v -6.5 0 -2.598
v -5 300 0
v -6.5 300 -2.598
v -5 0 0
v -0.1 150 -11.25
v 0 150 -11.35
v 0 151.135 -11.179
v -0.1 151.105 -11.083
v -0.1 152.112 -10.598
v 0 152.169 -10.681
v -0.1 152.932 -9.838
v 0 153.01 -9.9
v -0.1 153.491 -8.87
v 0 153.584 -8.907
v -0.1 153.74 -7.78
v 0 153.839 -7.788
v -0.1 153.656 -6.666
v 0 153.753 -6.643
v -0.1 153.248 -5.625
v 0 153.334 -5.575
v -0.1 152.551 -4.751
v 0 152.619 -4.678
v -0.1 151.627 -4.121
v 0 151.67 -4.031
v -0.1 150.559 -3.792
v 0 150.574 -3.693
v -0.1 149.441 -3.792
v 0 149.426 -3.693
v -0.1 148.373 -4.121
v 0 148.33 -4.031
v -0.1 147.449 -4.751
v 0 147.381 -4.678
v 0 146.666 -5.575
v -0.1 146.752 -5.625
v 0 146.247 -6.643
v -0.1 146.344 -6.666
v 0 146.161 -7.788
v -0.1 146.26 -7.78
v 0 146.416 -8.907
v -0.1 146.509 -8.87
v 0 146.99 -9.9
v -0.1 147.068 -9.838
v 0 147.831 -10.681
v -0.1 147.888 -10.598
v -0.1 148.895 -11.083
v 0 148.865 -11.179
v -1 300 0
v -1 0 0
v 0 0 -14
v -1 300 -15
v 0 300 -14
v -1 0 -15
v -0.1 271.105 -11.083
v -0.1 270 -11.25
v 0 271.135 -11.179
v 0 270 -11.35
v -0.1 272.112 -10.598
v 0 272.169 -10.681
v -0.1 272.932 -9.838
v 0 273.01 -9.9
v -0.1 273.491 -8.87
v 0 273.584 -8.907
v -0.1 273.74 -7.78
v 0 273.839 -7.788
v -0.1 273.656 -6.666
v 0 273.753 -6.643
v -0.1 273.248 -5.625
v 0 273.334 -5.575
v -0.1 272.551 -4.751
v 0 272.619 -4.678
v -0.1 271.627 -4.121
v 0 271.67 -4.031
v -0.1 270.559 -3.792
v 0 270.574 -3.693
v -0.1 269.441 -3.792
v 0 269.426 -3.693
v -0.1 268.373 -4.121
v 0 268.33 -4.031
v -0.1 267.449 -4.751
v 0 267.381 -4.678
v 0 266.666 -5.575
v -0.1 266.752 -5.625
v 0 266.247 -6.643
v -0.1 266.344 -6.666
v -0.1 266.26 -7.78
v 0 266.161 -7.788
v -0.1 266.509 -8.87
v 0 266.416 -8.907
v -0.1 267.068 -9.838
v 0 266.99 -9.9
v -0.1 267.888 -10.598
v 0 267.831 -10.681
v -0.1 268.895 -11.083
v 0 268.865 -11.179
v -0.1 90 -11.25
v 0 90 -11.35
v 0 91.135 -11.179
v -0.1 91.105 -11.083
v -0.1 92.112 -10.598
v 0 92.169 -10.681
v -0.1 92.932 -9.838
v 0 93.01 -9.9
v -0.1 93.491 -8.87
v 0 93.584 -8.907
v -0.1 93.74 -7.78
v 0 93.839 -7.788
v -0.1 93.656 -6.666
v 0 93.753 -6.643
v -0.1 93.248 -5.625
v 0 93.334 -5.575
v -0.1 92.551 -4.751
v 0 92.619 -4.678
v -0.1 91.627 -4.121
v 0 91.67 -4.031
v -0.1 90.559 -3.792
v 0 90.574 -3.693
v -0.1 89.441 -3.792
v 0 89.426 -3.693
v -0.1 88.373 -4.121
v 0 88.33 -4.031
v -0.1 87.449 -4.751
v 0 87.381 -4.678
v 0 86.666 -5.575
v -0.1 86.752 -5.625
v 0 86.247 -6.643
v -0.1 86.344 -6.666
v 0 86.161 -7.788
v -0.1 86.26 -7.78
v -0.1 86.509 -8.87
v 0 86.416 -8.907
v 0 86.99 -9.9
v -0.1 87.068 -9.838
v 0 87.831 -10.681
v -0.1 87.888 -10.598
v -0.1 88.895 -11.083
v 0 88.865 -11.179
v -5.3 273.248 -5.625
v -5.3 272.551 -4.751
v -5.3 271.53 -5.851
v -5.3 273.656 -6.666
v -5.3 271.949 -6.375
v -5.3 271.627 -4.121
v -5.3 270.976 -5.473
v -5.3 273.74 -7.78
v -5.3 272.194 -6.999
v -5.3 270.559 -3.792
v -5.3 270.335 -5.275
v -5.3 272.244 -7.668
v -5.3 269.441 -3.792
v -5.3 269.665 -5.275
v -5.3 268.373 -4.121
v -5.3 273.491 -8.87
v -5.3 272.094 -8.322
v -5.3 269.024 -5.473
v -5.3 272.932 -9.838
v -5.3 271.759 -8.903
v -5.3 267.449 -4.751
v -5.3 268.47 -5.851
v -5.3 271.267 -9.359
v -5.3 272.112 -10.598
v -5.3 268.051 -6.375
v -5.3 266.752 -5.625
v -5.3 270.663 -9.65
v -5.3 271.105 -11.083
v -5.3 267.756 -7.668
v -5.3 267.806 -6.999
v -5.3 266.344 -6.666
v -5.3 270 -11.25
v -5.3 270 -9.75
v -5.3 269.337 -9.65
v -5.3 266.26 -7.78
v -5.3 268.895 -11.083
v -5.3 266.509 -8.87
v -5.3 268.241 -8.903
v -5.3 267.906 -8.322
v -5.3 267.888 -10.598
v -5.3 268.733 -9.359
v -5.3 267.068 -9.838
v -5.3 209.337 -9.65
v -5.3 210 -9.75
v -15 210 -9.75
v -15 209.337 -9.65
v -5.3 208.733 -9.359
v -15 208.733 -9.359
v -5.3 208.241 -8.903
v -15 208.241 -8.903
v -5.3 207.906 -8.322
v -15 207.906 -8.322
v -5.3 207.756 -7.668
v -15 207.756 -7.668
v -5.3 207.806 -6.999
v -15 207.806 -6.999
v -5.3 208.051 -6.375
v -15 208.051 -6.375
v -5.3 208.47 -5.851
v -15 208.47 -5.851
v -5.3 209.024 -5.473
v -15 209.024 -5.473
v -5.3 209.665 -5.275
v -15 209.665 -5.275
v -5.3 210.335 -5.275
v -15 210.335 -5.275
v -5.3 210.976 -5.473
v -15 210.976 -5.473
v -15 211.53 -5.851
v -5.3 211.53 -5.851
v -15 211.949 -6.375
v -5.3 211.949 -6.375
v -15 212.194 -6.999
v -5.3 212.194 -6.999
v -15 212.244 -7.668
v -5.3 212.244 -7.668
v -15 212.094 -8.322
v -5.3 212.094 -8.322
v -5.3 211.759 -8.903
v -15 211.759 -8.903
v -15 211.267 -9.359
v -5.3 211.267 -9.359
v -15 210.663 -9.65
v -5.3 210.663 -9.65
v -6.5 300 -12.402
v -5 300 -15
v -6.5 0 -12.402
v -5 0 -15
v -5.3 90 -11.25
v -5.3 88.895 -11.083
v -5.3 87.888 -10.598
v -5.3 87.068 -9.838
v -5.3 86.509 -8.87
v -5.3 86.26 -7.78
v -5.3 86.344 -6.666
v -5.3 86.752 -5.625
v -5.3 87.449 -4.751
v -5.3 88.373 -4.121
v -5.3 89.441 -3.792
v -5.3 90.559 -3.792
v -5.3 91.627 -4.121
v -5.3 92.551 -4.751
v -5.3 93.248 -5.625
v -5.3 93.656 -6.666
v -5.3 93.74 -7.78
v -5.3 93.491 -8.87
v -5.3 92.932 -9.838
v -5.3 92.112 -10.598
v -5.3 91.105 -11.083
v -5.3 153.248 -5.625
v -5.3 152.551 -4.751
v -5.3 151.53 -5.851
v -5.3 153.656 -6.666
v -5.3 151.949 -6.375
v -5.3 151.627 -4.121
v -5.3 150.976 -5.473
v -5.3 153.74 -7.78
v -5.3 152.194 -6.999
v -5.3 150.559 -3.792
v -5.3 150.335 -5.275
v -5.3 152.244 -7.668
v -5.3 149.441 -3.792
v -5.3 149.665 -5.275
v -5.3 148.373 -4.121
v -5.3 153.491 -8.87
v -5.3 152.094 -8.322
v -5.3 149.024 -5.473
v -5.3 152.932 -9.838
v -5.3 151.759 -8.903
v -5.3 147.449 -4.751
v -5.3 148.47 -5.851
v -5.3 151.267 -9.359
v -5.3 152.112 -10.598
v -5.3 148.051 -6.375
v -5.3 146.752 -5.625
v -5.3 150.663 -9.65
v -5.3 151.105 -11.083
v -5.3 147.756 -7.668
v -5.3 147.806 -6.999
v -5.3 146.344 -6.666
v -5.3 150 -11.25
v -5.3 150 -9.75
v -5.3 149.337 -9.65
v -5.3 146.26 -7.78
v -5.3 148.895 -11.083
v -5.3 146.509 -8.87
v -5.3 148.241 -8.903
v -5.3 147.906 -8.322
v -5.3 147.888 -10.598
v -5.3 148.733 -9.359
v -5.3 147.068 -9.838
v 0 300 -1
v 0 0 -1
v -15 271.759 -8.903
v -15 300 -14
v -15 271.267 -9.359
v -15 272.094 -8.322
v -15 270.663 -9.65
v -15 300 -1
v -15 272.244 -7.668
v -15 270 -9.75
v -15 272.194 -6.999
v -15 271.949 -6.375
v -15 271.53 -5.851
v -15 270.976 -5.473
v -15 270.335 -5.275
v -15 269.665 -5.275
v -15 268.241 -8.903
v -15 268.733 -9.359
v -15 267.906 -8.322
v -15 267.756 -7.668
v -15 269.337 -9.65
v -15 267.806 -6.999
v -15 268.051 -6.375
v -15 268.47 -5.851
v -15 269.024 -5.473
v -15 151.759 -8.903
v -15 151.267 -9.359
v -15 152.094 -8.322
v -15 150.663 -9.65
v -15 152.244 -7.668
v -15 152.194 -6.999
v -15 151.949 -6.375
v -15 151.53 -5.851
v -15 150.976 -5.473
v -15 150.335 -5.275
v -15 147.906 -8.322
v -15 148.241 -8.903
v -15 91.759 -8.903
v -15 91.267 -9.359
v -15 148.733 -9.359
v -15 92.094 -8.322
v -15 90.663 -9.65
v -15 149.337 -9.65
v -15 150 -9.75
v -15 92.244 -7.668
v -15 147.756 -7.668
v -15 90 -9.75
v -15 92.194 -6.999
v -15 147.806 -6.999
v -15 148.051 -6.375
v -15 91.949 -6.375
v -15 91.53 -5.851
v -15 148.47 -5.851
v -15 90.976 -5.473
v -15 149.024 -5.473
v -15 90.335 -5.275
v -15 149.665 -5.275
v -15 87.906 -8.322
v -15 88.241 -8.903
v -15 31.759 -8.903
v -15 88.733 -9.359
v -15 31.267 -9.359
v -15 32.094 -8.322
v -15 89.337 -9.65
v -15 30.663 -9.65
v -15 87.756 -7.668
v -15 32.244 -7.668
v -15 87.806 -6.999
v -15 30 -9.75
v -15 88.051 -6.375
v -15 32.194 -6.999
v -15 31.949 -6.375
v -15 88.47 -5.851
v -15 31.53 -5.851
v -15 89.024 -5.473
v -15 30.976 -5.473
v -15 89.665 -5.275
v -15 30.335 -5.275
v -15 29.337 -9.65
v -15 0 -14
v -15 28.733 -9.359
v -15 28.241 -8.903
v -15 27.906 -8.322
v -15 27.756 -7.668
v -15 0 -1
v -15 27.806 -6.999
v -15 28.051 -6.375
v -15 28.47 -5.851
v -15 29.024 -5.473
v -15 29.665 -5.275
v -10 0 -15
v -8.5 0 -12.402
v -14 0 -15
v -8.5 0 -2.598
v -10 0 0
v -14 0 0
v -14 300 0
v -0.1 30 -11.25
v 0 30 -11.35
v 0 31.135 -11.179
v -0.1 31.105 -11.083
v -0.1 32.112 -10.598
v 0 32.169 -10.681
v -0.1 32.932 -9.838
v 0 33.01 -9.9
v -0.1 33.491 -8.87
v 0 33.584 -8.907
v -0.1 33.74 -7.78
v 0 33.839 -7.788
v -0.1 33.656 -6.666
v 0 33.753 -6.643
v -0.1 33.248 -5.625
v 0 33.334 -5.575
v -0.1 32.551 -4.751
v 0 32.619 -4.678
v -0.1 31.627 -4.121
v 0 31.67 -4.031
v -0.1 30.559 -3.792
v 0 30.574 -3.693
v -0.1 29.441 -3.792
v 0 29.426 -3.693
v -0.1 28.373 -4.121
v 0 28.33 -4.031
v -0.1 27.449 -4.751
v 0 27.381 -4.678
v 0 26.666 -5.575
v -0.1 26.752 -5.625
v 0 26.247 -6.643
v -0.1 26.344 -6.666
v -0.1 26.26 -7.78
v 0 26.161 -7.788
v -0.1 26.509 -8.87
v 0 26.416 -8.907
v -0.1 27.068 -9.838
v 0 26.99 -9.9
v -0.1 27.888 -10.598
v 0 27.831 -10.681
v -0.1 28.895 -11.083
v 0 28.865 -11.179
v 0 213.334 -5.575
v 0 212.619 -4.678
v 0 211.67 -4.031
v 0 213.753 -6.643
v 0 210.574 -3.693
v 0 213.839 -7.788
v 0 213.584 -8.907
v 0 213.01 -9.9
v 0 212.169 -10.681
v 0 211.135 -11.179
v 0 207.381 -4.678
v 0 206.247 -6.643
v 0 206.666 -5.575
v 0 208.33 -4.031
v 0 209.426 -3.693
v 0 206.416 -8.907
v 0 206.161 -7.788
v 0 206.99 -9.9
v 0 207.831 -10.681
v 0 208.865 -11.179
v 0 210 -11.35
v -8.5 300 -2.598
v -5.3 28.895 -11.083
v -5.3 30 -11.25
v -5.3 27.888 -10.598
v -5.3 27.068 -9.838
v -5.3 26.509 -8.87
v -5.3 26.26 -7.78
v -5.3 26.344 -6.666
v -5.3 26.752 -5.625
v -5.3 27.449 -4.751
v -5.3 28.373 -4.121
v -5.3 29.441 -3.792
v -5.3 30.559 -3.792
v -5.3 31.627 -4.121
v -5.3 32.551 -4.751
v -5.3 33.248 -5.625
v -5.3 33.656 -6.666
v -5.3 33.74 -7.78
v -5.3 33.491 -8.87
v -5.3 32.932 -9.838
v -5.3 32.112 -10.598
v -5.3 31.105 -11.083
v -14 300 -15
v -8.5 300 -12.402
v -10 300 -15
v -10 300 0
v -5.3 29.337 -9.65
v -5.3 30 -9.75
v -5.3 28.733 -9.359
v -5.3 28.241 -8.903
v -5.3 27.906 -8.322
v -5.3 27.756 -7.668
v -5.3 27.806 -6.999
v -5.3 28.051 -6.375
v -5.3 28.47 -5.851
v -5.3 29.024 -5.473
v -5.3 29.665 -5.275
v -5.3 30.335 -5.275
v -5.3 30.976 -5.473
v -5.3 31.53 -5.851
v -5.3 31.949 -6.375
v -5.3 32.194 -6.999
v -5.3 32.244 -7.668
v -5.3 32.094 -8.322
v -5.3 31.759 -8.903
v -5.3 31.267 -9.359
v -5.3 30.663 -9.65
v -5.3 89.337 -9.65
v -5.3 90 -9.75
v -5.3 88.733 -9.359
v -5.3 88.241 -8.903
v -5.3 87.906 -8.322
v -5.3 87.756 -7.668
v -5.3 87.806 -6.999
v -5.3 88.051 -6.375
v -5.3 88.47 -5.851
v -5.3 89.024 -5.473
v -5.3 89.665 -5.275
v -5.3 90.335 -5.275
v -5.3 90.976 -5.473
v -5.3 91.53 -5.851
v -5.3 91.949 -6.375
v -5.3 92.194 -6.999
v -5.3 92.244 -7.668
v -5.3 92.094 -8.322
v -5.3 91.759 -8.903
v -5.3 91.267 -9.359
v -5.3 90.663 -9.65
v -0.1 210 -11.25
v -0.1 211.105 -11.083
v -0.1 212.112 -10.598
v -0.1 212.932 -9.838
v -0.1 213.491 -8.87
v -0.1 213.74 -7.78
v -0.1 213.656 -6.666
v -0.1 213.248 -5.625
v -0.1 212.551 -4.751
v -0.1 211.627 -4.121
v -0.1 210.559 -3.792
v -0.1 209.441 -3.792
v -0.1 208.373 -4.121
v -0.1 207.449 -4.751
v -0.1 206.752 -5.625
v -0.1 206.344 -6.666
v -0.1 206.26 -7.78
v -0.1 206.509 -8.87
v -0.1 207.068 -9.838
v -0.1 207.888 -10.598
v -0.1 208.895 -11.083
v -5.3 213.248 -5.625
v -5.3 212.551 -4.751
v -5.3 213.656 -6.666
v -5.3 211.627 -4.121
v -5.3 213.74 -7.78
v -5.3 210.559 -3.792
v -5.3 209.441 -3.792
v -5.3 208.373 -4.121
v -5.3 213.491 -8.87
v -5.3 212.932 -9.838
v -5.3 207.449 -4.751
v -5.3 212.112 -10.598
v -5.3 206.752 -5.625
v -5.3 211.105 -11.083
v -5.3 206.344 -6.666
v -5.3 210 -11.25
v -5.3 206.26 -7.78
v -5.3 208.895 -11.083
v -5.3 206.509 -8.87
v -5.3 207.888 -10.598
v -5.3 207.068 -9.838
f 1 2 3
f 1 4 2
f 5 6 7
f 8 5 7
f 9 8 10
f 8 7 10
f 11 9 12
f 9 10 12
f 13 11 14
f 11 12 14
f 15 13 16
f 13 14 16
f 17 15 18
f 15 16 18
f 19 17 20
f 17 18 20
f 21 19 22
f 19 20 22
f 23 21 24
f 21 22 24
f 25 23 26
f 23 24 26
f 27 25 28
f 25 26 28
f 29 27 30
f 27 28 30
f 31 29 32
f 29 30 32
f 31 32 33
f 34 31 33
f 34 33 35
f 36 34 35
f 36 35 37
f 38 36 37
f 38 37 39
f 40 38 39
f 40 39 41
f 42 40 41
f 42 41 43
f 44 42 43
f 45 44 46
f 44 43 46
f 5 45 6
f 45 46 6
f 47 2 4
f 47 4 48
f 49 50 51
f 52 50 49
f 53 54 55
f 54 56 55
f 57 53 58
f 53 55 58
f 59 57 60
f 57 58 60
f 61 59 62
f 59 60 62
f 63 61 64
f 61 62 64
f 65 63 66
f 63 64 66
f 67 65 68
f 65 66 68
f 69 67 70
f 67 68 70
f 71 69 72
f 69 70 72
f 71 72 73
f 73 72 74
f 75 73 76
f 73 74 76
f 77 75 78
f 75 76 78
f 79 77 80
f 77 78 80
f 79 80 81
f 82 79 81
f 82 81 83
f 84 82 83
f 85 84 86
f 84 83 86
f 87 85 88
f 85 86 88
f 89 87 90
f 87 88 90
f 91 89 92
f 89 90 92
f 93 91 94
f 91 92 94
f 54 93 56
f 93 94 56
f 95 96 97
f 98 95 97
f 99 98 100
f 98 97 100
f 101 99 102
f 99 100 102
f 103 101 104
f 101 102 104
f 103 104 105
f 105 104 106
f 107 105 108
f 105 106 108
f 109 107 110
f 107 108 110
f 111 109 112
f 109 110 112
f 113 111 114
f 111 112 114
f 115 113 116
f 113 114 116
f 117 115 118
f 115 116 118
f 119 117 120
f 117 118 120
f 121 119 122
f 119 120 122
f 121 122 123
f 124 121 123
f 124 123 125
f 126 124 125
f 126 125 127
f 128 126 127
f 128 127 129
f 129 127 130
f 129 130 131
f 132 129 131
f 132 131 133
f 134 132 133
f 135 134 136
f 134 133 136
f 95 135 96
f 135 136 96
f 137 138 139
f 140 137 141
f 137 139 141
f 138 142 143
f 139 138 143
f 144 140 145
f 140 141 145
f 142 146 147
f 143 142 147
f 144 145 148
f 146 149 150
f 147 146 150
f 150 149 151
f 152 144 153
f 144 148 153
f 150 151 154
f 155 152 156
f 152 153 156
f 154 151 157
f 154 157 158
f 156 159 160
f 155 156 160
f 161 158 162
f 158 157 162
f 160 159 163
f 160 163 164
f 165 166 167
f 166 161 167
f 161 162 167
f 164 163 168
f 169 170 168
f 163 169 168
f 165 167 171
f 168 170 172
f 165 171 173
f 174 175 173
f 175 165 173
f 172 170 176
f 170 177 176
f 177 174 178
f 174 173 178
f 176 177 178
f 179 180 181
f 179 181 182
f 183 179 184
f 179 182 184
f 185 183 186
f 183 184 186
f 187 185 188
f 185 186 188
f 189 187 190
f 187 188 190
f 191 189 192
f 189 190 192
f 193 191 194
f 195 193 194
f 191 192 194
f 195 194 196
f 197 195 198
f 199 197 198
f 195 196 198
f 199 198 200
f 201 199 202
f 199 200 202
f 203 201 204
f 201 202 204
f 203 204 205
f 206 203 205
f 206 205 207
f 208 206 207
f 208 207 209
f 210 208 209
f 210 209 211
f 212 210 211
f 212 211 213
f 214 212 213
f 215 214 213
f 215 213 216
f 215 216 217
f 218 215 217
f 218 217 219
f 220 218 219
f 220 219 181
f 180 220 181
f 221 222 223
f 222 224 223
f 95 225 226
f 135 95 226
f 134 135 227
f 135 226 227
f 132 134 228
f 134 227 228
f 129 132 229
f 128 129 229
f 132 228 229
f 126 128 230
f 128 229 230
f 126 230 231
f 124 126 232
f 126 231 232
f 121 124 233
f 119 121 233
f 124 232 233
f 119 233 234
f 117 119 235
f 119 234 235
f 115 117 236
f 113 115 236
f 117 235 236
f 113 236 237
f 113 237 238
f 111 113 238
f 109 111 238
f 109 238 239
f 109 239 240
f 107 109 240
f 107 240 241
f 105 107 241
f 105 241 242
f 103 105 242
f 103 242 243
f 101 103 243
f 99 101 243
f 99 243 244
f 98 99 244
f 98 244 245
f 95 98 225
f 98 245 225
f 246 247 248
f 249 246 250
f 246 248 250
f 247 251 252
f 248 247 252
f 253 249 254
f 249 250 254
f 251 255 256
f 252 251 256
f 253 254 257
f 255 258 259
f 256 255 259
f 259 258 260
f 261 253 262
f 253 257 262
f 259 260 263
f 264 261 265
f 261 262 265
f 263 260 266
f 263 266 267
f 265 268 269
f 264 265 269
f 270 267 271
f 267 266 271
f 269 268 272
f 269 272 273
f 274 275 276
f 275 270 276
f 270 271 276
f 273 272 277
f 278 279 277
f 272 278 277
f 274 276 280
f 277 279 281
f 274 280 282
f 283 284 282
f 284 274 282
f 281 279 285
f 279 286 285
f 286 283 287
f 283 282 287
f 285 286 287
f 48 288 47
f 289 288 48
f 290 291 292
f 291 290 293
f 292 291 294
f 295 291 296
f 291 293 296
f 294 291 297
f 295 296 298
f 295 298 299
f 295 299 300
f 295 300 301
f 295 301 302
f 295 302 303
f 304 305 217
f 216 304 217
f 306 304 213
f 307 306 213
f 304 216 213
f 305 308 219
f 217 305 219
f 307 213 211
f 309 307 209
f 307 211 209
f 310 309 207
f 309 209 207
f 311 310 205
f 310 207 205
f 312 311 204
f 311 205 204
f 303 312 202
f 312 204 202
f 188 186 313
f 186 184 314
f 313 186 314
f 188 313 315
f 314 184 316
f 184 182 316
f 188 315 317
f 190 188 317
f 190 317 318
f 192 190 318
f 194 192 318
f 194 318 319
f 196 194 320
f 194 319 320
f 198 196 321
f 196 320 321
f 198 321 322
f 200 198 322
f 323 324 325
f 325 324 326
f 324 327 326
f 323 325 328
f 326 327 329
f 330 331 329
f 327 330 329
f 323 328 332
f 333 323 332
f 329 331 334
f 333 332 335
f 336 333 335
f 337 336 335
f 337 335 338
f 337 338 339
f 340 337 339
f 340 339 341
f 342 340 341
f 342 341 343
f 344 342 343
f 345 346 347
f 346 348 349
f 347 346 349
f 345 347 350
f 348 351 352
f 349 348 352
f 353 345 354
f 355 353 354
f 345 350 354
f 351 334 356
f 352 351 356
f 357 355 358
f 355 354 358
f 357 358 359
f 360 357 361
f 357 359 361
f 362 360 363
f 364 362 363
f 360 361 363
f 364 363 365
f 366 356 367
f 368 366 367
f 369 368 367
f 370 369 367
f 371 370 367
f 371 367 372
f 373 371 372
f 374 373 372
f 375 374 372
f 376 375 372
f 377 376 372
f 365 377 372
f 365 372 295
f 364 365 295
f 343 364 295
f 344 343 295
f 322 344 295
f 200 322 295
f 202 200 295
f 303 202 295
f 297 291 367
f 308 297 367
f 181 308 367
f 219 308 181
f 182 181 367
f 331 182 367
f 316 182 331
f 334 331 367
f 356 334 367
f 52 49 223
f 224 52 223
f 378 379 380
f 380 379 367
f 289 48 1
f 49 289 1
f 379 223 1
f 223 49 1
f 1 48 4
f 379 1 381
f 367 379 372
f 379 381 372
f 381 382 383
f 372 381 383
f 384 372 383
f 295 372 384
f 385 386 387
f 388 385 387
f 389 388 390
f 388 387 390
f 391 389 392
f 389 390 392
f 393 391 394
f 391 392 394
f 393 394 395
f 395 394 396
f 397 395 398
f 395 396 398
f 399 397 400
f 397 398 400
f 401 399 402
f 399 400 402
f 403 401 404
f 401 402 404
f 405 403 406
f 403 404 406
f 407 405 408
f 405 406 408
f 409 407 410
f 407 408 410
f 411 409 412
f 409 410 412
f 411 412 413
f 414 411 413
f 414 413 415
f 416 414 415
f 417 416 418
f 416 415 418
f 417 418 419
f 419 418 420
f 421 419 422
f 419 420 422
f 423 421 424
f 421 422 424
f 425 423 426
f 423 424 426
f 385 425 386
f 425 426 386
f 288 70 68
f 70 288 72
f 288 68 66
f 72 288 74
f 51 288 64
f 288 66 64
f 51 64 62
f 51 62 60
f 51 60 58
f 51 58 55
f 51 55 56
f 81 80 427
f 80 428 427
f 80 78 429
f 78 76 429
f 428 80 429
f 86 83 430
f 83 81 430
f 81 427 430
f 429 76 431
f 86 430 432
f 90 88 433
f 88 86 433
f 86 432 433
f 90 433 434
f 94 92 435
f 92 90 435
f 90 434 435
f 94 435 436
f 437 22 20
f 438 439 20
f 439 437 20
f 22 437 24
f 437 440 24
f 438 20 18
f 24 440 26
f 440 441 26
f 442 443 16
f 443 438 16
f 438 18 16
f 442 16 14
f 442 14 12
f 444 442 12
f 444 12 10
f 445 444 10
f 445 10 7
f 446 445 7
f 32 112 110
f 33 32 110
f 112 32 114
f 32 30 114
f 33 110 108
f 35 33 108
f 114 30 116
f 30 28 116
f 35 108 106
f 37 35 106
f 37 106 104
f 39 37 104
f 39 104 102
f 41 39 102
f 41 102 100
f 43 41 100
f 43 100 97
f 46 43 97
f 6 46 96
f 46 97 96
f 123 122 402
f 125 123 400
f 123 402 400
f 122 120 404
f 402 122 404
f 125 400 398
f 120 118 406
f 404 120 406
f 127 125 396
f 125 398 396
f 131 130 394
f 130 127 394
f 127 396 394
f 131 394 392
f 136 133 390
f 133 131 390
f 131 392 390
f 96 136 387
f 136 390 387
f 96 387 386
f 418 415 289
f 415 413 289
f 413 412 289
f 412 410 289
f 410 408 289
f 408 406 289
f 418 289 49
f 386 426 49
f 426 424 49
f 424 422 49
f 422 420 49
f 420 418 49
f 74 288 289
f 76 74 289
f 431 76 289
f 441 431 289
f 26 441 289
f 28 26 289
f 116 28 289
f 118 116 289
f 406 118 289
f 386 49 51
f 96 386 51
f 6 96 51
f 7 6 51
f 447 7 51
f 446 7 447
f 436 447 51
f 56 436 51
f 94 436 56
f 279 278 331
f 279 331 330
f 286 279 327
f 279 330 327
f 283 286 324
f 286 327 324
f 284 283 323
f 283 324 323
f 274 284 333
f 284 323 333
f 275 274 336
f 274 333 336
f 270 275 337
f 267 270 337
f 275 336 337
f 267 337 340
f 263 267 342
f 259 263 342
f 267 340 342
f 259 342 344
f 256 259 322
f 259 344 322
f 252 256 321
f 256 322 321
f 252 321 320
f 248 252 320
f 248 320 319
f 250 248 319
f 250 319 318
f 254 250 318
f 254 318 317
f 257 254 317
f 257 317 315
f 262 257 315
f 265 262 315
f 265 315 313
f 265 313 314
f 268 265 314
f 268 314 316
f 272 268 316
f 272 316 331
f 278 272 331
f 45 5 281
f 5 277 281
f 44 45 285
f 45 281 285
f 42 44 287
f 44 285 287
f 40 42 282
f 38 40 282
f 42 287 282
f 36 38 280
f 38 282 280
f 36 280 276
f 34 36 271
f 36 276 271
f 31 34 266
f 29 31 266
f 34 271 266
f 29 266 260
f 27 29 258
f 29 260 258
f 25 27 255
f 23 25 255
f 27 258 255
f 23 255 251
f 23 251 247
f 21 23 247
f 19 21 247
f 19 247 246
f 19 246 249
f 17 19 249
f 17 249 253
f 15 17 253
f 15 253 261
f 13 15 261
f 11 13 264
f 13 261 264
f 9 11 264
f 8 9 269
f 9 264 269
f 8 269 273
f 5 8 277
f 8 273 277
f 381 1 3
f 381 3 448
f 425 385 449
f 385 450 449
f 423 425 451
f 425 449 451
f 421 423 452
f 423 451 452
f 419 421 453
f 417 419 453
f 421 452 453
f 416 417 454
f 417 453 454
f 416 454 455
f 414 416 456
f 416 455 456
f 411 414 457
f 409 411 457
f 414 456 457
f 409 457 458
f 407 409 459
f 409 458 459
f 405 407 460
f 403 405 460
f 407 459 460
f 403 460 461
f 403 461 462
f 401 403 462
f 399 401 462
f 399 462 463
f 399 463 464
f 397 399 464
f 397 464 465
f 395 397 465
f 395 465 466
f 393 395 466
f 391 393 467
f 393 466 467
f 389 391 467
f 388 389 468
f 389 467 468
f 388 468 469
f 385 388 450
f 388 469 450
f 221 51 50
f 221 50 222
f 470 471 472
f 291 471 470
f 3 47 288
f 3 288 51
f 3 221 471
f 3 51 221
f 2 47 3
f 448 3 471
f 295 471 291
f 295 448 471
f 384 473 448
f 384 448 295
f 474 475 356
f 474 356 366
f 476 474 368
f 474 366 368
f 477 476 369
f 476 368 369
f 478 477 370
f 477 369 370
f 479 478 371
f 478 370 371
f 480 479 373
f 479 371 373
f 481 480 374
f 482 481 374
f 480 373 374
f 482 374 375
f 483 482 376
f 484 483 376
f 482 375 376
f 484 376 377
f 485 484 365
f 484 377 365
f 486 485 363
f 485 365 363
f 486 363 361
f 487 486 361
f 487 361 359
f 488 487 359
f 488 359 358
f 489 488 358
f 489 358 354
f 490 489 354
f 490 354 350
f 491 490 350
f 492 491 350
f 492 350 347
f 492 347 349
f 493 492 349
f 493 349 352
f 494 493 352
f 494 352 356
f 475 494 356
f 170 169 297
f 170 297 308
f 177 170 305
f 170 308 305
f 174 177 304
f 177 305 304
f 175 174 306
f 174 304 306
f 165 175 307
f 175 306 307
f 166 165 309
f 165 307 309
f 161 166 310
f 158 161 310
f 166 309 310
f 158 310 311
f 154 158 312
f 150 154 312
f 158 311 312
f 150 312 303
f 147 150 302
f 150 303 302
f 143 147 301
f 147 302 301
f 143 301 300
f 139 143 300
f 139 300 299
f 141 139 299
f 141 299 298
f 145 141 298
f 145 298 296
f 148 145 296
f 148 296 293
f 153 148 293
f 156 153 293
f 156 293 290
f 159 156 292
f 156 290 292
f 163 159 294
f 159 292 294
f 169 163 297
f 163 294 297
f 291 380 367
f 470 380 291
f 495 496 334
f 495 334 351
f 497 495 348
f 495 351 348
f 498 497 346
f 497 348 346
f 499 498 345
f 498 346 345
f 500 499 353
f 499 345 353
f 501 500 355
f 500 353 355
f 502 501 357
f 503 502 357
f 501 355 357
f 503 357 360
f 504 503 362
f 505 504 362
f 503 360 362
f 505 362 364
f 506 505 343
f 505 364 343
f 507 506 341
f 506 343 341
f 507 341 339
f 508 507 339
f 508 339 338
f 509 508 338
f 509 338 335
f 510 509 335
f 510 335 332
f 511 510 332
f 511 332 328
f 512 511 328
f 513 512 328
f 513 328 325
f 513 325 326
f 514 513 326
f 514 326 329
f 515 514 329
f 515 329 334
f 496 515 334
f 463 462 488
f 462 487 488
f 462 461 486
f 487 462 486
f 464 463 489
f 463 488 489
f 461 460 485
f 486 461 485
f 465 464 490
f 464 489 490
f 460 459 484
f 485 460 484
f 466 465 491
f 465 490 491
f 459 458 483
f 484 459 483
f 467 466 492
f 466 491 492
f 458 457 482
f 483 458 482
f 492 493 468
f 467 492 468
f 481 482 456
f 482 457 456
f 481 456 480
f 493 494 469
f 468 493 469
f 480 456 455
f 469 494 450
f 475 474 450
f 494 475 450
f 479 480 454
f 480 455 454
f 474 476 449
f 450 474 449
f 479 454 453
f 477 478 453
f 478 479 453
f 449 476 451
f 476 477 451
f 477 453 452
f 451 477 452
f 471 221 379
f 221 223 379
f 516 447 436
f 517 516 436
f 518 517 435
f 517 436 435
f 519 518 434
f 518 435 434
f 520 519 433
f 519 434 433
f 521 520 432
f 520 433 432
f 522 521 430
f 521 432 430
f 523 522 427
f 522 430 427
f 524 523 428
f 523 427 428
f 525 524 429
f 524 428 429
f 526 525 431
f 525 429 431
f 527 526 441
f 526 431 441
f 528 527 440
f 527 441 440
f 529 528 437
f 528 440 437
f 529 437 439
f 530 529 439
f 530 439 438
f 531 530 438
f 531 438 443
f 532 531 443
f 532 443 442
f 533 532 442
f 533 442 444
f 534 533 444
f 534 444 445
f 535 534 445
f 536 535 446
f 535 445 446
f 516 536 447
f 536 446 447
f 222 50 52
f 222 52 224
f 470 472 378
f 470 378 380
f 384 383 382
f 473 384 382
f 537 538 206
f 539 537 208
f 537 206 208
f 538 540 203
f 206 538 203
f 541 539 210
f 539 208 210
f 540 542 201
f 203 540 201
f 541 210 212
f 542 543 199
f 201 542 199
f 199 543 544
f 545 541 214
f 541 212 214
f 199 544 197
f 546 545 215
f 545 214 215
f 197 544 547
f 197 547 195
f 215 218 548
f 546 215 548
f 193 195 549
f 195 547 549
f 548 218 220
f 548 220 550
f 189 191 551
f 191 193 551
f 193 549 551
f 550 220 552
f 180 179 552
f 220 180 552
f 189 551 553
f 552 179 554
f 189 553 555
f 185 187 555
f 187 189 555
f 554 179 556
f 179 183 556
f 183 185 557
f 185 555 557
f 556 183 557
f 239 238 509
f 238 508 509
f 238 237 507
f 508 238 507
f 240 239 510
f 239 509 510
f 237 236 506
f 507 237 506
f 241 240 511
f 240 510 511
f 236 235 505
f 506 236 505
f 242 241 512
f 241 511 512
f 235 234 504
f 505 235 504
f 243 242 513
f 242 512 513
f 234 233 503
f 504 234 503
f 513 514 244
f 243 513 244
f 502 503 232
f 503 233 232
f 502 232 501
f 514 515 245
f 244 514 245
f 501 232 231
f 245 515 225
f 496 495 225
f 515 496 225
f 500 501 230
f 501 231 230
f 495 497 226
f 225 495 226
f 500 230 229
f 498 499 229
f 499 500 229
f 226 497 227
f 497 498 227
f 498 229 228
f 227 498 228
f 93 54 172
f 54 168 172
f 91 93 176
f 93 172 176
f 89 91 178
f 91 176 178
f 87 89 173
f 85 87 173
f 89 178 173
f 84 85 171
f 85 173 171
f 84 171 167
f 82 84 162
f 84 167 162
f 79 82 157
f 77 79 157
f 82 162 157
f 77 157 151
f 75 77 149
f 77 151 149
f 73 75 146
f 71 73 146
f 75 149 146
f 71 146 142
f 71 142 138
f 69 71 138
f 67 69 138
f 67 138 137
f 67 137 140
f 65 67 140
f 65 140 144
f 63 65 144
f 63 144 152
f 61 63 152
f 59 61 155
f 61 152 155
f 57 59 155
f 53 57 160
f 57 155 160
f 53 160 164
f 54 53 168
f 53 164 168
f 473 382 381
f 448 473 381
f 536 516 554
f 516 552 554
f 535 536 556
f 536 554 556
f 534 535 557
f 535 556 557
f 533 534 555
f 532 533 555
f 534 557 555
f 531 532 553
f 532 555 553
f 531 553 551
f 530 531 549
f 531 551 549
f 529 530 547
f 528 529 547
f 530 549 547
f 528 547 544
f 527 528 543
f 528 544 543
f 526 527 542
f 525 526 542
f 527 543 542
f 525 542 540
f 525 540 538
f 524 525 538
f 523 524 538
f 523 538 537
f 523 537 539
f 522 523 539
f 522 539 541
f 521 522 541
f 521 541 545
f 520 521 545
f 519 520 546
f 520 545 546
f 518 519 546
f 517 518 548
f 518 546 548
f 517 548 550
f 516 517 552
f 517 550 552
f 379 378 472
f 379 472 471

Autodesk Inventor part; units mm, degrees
ref_plane "YZ Plane" through (0, 0, 0) normal (1, 0, 0) x (0, 1, 0)
ref_plane "XZ Plane" through (0, 0, 0) normal (0, 1, 0) x (-1, 0, 0)
ref_plane "XY Plane" through (0, 0, 0) normal (0, 0, 1) x (1, 0, 0)
sketch "Skizze1" plane through (0, 0, 0) normal (0, 1, 0) x (-1, 0, 0)
  line L0 (0, 0) -> (0, -15)
  line L1 (0, -15) -> (5, -15)
  line L2 (5, -15) -> (10, -15) construction
  line L3 (10, -15) -> (15, -15)
  line L4 (15, -15) -> (15, 0)
  line L5 (15, 0) -> (10, 0)
  line L6 (10, 0) -> (5, 0) construction
  line L7 (5, 0) -> (0, 0)
  line L8 (0, -7.5) -> (0, -5.25) construction
  line L9 (0, -5.25) -> (0, -9.75) construction
  line L10 (0, -9.75) -> (9.7, -9.75) construction
  line L11 (0, -5.25) -> (9.7, -5.25) construction
  line L12 (15, -7.5) -> (15, -3.9) construction
  line L13 (15, -3.9) -> (15, -11.4) construction
  line L14 (15, -11.4) -> (9.7, -11.4) construction
  line L15 (9.7, -11.4) -> (9.7, -9.75) construction
  line L16 (15, -3.9) -> (9.7, -3.9) construction
  line L17 (9.7, -3.9) -> (9.7, -5.25) construction
  line L18 (10, 0) -> (8.5, -2.5981)
  line L19 (10, 0) -> (13, 0) construction
  line L20 (5, 0) -> (6.5, -2.5981)
  line L21 (5, 0) -> (8, 0) construction
  line L22 (6.5, -2.5981) -> (8.5, -2.5981)
  line L23 (10, -15) -> (8.5, -12.4019)
  line L24 (10, -15) -> (13, -15) construction
  line L25 (5, -15) -> (6.5, -12.4019)
  line L26 (5, -15) -> (8, -15) construction
  line L27 (6.5, -12.4019) -> (8.5, -12.4019)
  dimension "d0" = 15
  dimension "d1" = 5
  dimension "d2" = 5
  dimension "d3" = 5
  dimension "d4" = 15
  dimension "d5" = 5
  dimension "d6" = 5
  dimension "d7" = 2.25
  dimension "d8" = 4.5
  dimension "d9" = 9.7
  dimension "d10" = 9.7
  dimension "d11" = 3.6
  dimension "d12" = 7.5
  dimension "d13" = 5.3
  dimension "d14" = 3
  dimension "d15" = 120
  dimension "d16" = 3
  dimension "d17" = 60
  dimension "d18" = 3
  dimension "d19" = 120
  dimension "d20" = 3
  dimension "d21" = 60
extrude "Extrusion1" add sketch "Skizze1" along normal blind 300
sketch "Skizze2" plane through (0, 0, 0) normal (1, 0, 0) x (0, 0, -1)
  line L0 (15, 300) -> (0, 300) construction
  line L1 (7.5, 300) -> (7.5, 270) construction
  line L2 (7.5, 270) -> (7.5, 210) construction
  line L3 (7.5, 210) -> (7.5, 150) construction
  line L4 (7.5, 150) -> (7.5, 90) construction
  line L5 (7.5, 90) -> (7.5, 30) construction
  point P0 (0, 0)
  dimension "d25" = 30
  dimension "d26" = 60
  dimension "d27" = 60
  dimension "d28" = 60
  dimension "d29" = 60
hole "Bohrung1" at (0, 270, -7.5) at (0, 210, -7.5) at (0, 150, -7.5) at (0, 90, -7.5) at (0, 30, -7.5) direction (-1, 0, 0) diameter 4.5 end through all counterbore diameter 7.5 counterbore depth 5.3 clearance for "Innensechskantkopfschraube" size "M4" standard "ANSI Metrisches M Profil"
chamfer "Fase1" distance 1 angle 45 4 edges at (0, 150, -15) (0, 150, 0) (-15, 150, -15) (-15, 150, 0)
chamfer "Fase2" distance 0.1 angle 45 5 edges at (0, 270, -3.75) (0, 210, -3.75) (0, 150, -3.75) (0, 90, -3.75) (0, 30, -3.75)
properties part number "Linearführung" material "Edelstahl"
